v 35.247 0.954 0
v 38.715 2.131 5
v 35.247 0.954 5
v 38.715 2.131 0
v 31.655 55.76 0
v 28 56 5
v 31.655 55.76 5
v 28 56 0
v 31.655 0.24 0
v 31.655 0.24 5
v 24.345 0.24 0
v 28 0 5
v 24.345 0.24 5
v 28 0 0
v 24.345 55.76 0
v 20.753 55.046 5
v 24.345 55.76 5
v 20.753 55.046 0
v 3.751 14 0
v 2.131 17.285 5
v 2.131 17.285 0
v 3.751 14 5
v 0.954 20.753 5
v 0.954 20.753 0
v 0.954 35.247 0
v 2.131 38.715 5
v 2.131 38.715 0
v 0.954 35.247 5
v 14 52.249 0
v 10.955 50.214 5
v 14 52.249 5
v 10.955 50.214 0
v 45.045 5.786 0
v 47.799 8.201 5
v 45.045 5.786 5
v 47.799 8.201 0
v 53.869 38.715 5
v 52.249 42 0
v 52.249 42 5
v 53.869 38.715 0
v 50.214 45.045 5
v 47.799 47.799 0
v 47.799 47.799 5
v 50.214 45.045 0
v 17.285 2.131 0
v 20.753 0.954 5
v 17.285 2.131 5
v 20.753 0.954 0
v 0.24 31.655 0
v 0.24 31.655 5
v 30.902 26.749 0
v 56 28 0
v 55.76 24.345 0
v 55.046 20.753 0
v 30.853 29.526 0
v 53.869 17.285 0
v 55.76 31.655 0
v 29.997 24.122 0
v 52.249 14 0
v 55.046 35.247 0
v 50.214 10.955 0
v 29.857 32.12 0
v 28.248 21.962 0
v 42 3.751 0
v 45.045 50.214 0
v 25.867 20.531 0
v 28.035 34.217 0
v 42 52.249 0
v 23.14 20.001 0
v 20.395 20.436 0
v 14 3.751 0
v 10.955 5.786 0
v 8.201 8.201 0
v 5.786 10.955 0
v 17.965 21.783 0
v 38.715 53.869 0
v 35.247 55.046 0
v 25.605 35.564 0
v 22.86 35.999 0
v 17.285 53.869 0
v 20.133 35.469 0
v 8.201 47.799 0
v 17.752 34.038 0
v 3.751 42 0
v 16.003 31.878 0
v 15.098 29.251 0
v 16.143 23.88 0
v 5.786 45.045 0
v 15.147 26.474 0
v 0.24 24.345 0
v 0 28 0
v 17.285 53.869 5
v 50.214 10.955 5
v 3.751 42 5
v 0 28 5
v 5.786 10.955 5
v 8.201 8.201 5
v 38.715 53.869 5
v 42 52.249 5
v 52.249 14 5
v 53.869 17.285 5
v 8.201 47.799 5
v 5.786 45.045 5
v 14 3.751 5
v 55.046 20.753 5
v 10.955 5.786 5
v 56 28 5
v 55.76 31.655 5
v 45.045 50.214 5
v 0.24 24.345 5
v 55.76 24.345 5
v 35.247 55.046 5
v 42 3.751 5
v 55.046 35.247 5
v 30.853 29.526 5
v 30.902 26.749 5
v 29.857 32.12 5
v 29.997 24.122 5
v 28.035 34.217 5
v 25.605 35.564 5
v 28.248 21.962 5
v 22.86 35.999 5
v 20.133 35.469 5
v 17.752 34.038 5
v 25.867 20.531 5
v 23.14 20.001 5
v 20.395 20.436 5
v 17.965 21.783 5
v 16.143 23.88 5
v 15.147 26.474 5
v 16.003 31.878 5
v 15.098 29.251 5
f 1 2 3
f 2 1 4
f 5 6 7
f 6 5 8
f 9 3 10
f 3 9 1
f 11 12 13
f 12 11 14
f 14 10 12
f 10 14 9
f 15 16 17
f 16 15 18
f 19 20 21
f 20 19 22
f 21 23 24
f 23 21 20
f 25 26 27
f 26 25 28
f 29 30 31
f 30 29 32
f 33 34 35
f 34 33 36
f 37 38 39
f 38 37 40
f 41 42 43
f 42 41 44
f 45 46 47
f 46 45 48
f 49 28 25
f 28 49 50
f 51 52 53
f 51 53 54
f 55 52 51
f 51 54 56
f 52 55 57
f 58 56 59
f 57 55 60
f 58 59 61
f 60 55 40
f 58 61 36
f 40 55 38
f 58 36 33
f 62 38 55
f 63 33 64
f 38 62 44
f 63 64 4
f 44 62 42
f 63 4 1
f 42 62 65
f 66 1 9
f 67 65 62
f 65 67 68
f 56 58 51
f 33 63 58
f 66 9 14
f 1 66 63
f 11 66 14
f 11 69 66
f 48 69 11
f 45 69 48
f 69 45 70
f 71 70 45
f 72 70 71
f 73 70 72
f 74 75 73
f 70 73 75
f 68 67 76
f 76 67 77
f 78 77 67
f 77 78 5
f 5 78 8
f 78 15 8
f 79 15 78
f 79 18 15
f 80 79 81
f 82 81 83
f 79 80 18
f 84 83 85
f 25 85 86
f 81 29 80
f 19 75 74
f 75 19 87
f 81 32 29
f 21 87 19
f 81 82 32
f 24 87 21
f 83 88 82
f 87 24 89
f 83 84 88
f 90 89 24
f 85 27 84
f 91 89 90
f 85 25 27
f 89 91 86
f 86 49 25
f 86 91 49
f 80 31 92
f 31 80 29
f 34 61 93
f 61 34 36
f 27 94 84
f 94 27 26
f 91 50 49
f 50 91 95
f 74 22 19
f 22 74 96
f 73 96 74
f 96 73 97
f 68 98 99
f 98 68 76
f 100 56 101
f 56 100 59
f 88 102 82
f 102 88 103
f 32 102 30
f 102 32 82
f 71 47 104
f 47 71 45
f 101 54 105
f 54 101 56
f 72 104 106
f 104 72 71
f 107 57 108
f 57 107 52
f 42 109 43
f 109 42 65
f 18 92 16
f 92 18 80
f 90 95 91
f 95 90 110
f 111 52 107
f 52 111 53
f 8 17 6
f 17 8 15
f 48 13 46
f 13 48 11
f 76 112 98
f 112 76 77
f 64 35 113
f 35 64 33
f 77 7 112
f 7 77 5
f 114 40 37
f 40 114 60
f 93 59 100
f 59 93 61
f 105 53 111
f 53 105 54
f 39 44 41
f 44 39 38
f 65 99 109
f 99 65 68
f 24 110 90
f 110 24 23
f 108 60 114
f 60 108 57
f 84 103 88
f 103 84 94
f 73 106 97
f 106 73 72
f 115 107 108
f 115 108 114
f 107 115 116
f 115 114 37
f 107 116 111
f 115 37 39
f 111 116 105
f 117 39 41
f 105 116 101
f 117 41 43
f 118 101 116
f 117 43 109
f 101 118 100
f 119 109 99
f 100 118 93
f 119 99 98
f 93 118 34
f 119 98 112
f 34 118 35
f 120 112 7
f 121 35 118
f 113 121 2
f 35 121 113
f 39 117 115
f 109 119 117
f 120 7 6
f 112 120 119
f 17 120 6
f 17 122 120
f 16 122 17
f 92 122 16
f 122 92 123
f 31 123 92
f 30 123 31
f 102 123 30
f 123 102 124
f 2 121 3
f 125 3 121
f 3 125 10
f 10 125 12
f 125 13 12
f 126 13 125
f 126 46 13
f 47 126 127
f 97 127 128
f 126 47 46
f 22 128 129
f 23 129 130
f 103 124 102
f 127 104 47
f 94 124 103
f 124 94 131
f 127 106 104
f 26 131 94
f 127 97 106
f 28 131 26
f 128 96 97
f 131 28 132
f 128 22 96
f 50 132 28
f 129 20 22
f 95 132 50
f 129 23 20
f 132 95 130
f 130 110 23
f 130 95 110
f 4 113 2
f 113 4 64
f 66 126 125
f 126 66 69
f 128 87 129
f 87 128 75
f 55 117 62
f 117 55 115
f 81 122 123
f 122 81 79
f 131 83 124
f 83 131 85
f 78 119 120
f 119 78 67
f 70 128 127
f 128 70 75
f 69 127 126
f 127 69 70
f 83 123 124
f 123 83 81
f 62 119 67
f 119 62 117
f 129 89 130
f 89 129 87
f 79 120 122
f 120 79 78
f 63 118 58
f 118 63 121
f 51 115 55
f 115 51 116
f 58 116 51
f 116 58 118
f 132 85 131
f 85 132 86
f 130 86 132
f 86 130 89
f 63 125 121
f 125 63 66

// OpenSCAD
$fn = 32;

// ----------------------------------------------------------------------
// Cam plate: eccentric cam, base R28
// ----------------------------------------------------------------------

// --- parameters (mm) ---
base_r = 28;              // base circle radius
lobe_h = 10;              // cam lobe rise
bore_r = 8;               // shaft bore radius
plate_t = 5;              // plate thickness, Z (extrusion height)
ecc = 5;                  // disc eccentricity

profile = [[56, 28], [55.76, 31.655], [55.046, 35.247], [53.869, 38.715], [52.249, 42], [50.214, 45.045], [47.799, 47.799], [45.045, 50.214], [42, 52.249], [38.715, 53.869], [35.247, 55.046], [31.655, 55.76], [28, 56], [24.345, 55.76], [20.753, 55.046], [17.285, 53.869], [14, 52.249], [10.955, 50.214], [8.201, 47.799], [5.786, 45.045], [3.751, 42], [2.131, 38.715], [0.954, 35.247], [0.24, 31.655], [0, 28], [0.24, 24.345], [0.954, 20.753], [2.131, 17.285], [3.751, 14], [5.786, 10.955], [8.201, 8.201], [10.955, 5.786], [14, 3.751], [17.285, 2.131], [20.753, 0.954], [24.345, 0.24], [28, 0], [31.655, 0.24], [35.247, 0.954], [38.715, 2.131], [42, 3.751], [45.045, 5.786], [47.799, 8.201], [50.214, 10.955], [52.249, 14], [53.869, 17.285], [55.046, 20.753], [55.76, 24.345]];  // primary outline, 48 points, counter clockwise
void_1 = [[30.853, 29.526], [29.857, 32.12], [28.035, 34.217], [25.605, 35.564], [22.86, 35.999], [20.133, 35.469], [17.752, 34.038], [16.003, 31.878], [15.098, 29.251], [15.147, 26.474], [16.143, 23.88], [17.965, 21.783], [20.395, 20.436], [23.14, 20.001], [25.867, 20.531], [28.248, 21.962], [29.997, 24.122], [30.902, 26.749]];  // shaft bore, 18 points

// --- the one profile operation ---
difference() {
  linear_extrude(height = plate_t) polygon(points = profile);
  translate([0, 0, -1])
    linear_extrude(height = plate_t + 2) polygon(points = void_1);
}
